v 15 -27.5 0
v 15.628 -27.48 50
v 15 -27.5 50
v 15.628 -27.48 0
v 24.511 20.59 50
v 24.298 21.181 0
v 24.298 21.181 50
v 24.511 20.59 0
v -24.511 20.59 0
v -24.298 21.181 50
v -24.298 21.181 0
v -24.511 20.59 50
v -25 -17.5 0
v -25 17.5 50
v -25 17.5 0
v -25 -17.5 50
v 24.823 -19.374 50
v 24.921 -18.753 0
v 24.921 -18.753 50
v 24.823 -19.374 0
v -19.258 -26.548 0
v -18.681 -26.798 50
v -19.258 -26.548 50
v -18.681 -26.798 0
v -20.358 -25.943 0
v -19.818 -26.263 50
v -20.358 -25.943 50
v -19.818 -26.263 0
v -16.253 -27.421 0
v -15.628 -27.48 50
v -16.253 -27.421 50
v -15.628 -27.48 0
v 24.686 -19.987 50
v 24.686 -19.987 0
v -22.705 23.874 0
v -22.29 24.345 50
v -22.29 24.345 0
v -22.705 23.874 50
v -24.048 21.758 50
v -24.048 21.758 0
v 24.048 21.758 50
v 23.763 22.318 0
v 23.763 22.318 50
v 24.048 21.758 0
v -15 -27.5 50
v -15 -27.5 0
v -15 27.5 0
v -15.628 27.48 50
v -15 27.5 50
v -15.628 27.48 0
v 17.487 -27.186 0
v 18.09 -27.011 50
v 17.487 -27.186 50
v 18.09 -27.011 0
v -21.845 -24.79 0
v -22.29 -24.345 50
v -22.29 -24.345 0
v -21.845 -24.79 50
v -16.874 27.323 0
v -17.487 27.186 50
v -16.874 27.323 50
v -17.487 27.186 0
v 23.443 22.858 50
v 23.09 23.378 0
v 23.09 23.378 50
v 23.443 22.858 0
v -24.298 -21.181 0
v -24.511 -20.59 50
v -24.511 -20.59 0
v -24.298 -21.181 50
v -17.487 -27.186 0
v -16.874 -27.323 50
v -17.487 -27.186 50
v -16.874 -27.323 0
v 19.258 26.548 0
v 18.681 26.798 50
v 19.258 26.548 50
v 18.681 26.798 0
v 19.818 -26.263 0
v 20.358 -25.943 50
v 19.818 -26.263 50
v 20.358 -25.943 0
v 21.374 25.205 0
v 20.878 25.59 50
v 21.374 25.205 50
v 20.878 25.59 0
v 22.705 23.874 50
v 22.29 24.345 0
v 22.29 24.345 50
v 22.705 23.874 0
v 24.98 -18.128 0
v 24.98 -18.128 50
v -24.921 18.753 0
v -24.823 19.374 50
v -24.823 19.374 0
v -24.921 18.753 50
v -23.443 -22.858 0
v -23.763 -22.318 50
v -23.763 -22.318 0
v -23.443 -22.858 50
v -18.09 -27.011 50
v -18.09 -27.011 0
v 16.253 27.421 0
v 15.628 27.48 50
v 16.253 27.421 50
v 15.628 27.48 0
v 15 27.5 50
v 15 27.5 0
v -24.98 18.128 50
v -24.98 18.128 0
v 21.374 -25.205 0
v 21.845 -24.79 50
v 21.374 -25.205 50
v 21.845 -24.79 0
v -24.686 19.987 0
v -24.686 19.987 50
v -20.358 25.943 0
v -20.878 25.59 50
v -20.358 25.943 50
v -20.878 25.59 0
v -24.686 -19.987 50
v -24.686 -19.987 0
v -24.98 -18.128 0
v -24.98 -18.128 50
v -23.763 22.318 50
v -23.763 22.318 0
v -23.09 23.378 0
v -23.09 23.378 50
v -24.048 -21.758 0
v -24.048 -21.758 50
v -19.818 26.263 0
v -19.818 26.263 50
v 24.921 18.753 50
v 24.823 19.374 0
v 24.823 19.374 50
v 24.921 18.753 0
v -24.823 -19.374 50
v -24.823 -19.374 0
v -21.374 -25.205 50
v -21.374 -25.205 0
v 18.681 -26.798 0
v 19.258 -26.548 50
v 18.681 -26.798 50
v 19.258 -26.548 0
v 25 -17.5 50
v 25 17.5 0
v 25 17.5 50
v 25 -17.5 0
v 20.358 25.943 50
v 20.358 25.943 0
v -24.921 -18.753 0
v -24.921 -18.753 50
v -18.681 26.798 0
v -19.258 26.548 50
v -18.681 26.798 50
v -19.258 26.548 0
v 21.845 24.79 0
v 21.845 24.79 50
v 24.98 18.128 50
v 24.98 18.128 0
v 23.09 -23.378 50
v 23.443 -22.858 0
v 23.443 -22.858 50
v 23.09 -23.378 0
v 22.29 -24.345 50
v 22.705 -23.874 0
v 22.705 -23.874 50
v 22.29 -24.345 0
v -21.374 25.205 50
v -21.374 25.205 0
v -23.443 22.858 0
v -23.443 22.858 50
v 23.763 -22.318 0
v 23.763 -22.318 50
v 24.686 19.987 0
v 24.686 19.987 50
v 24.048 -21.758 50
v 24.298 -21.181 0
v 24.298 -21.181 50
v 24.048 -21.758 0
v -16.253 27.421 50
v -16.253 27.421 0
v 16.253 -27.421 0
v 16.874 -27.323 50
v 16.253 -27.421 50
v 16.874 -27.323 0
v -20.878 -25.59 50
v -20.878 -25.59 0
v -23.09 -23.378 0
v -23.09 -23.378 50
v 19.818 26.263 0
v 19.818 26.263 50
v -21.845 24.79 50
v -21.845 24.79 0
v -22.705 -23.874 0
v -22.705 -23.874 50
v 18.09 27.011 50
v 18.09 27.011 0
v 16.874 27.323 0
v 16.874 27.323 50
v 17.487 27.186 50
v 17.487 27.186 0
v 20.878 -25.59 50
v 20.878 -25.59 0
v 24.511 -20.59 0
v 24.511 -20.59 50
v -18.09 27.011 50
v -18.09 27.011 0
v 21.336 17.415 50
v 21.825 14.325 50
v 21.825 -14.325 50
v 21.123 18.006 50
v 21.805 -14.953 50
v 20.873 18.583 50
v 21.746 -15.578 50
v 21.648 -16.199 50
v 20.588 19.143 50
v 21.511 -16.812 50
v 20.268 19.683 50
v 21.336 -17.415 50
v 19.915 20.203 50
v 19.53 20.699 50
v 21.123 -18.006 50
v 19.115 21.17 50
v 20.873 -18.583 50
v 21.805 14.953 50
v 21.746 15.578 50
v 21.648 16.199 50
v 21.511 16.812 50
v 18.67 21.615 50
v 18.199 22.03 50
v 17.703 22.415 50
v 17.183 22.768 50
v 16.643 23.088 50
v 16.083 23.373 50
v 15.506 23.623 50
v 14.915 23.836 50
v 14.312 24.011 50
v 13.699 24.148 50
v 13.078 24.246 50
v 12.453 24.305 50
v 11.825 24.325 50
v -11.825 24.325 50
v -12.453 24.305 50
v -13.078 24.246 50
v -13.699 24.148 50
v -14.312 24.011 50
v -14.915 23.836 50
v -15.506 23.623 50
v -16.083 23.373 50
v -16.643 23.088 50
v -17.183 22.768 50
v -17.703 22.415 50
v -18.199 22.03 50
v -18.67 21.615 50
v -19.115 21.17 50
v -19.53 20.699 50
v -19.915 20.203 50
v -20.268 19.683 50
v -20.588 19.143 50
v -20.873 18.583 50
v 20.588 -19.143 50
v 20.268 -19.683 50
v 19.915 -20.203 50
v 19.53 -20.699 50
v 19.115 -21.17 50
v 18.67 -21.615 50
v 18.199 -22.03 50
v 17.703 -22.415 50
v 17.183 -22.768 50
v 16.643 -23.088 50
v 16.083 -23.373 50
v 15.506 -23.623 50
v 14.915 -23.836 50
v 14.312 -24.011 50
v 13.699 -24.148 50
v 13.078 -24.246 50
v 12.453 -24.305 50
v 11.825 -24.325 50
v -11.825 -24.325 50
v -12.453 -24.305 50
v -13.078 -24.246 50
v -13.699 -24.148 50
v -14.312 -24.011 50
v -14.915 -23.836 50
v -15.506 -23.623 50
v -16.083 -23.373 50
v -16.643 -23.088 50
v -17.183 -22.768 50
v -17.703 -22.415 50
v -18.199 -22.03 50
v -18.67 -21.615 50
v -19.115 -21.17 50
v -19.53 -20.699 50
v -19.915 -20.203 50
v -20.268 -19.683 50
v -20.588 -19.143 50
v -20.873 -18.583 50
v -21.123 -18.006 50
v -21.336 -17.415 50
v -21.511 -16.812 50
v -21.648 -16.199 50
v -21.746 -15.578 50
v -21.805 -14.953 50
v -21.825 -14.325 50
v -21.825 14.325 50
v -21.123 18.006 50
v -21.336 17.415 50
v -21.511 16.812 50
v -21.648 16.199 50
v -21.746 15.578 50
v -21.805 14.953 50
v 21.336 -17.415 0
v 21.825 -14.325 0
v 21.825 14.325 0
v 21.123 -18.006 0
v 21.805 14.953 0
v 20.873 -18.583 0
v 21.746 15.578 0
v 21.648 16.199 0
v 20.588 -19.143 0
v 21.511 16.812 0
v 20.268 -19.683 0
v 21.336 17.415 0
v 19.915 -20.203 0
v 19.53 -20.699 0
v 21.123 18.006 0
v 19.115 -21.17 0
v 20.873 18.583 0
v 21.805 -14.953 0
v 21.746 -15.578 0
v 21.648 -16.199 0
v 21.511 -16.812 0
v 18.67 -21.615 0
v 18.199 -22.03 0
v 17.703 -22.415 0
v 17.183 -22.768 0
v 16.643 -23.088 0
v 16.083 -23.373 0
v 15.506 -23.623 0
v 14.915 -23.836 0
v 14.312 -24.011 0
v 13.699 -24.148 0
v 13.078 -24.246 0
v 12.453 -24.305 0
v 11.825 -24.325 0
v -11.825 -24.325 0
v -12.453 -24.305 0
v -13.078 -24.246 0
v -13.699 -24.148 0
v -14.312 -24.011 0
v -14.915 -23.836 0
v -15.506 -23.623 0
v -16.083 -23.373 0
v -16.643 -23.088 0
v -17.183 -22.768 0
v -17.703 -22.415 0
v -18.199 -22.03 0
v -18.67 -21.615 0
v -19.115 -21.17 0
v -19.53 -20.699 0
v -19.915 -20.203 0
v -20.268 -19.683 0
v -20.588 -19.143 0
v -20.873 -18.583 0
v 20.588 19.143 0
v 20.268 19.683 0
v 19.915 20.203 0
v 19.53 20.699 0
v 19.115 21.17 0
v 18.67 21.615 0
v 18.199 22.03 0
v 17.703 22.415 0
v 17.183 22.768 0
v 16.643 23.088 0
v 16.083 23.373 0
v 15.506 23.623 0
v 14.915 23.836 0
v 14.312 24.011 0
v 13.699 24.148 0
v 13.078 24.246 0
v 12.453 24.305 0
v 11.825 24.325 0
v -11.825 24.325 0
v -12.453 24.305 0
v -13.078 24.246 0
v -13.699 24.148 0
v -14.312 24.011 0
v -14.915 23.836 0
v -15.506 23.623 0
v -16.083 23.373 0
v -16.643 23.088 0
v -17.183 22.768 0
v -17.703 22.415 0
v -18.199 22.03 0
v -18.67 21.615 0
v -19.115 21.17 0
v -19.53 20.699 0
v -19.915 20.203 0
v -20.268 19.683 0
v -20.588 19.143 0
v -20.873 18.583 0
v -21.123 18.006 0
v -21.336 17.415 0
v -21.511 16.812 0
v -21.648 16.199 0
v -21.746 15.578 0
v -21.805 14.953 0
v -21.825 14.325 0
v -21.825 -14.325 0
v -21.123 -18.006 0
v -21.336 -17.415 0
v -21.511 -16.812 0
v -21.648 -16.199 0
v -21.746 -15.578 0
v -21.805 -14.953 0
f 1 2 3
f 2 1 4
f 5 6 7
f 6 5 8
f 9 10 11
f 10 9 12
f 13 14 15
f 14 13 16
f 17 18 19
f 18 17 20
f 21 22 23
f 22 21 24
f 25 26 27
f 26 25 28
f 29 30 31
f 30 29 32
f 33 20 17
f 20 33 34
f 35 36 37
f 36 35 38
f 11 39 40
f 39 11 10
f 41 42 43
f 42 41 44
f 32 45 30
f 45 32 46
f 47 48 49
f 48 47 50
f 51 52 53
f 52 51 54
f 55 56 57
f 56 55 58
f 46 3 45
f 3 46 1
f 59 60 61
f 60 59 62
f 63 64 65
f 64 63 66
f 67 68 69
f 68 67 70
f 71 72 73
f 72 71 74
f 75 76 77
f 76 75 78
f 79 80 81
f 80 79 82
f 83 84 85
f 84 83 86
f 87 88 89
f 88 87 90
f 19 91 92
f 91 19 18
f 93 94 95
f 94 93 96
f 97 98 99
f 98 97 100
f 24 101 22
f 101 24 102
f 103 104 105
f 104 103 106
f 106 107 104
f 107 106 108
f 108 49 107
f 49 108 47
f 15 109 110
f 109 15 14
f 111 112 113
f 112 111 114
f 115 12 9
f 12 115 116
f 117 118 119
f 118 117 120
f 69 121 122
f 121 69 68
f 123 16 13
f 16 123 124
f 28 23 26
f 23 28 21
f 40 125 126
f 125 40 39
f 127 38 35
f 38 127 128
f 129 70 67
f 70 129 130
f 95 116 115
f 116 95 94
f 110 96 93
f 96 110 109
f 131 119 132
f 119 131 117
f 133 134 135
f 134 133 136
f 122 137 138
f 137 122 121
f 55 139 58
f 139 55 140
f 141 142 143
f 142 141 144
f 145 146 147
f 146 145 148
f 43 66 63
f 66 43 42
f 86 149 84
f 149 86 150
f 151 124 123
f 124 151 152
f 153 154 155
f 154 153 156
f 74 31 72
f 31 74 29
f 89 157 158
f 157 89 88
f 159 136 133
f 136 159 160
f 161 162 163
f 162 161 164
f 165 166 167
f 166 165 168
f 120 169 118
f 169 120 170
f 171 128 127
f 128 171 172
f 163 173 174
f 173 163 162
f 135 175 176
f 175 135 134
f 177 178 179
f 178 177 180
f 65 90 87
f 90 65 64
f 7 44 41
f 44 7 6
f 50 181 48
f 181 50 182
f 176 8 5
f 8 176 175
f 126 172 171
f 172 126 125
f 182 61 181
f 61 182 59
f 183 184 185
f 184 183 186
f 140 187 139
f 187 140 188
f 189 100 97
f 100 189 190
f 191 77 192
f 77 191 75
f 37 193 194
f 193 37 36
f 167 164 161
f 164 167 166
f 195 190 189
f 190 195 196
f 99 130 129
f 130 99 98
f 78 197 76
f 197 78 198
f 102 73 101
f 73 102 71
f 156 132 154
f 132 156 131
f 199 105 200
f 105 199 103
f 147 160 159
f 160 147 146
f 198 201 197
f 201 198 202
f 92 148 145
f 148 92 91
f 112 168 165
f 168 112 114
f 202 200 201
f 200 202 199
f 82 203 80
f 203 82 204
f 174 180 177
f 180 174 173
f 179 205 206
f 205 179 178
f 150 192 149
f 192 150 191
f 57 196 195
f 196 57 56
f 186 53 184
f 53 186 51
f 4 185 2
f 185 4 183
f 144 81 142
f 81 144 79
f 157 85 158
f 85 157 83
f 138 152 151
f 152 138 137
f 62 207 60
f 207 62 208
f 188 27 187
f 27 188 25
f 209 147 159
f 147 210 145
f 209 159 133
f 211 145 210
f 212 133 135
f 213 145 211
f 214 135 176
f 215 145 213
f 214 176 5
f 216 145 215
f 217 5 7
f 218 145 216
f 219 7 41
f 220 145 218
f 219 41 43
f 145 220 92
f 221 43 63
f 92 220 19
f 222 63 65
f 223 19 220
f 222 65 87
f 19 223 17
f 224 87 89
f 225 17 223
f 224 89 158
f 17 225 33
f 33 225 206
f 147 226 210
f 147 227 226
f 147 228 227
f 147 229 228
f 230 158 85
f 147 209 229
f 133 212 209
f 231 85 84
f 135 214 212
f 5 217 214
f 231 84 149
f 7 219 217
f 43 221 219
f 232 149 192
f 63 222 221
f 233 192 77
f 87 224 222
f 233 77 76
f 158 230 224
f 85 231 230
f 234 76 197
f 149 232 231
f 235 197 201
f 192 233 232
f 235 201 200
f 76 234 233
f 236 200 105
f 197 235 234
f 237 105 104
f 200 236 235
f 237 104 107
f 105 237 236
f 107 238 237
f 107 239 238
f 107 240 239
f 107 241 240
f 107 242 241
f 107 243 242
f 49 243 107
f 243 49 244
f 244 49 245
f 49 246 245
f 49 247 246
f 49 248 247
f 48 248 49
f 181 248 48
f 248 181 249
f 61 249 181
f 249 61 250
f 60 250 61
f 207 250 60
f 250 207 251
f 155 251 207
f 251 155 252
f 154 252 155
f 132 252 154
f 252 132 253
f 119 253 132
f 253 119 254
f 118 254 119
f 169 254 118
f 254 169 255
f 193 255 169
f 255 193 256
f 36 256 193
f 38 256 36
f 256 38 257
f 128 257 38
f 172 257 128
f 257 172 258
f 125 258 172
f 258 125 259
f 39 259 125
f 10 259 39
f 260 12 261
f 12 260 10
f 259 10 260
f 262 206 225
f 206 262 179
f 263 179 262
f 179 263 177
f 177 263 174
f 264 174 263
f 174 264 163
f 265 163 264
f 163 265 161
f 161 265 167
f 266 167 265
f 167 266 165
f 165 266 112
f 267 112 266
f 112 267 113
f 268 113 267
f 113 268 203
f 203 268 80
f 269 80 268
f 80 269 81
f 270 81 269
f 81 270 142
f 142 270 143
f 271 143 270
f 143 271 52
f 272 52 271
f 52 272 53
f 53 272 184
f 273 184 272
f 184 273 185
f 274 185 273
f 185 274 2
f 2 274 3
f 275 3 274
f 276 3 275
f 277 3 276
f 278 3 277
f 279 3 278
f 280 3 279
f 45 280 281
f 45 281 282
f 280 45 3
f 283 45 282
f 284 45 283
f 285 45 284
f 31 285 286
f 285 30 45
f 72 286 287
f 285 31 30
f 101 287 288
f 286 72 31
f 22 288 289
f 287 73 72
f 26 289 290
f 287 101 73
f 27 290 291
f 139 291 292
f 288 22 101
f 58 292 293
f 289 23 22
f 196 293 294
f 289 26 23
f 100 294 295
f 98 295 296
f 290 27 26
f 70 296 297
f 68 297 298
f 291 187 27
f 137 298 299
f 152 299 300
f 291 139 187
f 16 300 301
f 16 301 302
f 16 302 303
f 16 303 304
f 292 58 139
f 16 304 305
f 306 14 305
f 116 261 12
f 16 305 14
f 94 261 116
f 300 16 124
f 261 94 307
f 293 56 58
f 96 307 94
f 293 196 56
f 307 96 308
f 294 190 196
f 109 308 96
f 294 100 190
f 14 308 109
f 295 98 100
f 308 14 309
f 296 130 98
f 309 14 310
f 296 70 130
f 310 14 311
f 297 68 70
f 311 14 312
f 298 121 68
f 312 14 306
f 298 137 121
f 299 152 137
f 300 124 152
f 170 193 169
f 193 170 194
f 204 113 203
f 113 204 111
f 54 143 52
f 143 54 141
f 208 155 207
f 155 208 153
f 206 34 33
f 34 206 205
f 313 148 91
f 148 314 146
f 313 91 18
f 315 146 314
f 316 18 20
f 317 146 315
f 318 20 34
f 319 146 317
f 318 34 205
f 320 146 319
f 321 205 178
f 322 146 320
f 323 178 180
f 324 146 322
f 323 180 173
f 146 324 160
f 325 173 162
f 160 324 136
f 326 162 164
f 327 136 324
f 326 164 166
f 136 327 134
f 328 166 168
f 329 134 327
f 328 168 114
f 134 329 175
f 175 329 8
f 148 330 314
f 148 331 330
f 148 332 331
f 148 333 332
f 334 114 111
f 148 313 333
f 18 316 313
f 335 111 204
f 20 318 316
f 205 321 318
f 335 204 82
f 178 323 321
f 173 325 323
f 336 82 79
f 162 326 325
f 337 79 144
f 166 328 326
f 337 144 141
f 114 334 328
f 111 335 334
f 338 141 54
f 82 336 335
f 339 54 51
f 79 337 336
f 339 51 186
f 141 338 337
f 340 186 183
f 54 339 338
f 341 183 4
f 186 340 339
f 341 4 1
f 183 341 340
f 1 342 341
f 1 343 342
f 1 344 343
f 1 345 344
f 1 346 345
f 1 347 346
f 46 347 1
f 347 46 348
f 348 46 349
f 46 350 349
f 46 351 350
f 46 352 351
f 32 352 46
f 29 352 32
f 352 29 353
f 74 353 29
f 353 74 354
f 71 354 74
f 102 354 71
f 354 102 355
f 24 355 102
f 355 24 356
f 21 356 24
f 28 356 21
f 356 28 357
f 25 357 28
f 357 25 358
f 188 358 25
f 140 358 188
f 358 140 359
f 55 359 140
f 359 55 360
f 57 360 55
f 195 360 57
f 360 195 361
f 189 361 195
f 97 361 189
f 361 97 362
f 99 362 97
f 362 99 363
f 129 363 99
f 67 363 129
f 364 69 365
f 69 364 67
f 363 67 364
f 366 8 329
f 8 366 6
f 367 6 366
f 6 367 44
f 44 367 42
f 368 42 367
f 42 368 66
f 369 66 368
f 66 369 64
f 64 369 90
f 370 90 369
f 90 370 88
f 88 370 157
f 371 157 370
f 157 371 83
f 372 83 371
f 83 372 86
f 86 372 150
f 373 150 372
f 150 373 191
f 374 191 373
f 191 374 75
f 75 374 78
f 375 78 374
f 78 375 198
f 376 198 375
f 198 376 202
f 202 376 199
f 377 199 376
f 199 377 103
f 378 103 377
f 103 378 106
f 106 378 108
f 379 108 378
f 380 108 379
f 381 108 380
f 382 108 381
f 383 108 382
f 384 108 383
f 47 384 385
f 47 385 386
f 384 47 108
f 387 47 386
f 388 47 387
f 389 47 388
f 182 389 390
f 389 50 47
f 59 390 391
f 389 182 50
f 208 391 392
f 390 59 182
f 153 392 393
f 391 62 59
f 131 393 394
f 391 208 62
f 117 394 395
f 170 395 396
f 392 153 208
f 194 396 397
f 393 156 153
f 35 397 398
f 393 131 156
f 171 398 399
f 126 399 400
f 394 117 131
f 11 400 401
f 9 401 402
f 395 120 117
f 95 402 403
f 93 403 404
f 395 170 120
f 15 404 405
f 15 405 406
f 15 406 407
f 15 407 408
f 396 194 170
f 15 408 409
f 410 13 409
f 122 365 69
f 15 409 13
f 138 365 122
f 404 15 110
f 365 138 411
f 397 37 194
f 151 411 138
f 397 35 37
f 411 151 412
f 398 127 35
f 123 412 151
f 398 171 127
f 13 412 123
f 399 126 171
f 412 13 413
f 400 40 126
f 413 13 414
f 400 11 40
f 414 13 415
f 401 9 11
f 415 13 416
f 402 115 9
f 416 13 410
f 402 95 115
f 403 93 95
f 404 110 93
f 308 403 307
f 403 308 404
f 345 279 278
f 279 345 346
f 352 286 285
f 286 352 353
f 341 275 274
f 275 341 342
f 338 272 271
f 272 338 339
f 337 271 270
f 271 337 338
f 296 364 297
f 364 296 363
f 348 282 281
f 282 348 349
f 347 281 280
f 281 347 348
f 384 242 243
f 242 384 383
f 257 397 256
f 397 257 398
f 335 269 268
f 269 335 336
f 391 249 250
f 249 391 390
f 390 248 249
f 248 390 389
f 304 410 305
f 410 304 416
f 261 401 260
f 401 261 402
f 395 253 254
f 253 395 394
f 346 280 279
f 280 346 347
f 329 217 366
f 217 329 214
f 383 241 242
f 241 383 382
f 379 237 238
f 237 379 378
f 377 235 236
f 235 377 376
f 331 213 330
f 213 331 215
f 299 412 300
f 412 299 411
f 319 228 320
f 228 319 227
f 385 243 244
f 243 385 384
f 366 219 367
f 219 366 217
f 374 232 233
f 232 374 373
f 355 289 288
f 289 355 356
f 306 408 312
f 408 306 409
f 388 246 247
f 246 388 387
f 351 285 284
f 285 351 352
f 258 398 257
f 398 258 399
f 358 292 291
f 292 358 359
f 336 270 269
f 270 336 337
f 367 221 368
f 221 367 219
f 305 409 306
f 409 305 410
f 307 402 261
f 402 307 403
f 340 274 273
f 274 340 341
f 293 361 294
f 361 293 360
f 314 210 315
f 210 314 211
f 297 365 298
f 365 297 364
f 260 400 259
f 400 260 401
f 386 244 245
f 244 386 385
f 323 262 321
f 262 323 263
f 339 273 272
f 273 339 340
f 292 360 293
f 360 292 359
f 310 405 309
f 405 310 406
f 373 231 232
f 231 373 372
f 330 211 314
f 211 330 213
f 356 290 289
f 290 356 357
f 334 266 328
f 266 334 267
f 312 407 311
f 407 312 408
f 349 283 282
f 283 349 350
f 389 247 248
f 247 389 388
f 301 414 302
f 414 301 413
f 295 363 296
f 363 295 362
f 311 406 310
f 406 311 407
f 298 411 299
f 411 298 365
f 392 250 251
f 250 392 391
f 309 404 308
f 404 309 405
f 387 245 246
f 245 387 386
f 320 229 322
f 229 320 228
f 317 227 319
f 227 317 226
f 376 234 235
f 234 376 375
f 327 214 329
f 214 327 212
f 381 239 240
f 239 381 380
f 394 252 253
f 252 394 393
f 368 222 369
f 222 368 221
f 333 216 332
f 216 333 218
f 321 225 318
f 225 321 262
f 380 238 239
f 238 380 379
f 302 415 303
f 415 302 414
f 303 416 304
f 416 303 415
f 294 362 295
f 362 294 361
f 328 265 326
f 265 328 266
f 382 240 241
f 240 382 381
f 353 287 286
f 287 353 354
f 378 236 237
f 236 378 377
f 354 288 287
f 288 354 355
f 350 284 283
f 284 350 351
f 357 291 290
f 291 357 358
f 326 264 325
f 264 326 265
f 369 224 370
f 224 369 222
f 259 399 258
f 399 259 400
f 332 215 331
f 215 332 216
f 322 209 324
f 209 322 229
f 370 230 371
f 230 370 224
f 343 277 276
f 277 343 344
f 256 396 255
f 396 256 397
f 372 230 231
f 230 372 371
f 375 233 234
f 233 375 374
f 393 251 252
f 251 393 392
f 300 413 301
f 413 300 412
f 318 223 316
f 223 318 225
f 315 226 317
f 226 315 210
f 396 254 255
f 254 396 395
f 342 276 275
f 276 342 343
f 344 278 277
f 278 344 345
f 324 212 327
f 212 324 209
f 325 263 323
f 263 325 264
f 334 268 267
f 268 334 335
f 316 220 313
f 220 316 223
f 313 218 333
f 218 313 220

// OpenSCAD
// file: variables.scad
// Global
overlap = 0.01; 
centered = true;
$fn = 100;
in = 25.4;
cm = 10;
mm = 1;
thickness = 0.25 *in;

// Head
head_radius = 3 *in;
head_translation = 6 *in;
head_depth = 8 *in;
head_thickness = 0.25 *in;
head_height = head_radius * 2;
head_width = head_radius * 2 + head_translation;

// Chest
chest_width = 8.5 * in; 
chest_height = 6 *in; 
chest_offset = 1 *in;
chest_depth = 6.5 *in; 
chest_thickness = 0.25 *in;

// Base 
base_width = 8.5 *in;
base_height = 6 *in;
base_offset = 1 *in;
base_depth = 140 *mm;
base_top_width = 108 *mm;
base_top_height = 76 *mm;
base_top_depth = 55 *mm;
base_top_offset = 1 *in;
base_thickness = 0.25 *in;
base_divot_width = 70 *mm;
base_divot_height = 15 *mm;
base_divot_depth = 50 *mm;
caster_hole_diameter = 5*mm;
caster_hole_from_width1 = 3 *mm + caster_hole_diameter/2;
caster_hole_from_width2 = 2.5 *mm + caster_hole_diameter/2;
caster_hole_from_height = 8.5 *mm + caster_hole_diameter/2;

// Shoulder
shoulder_diameter = 2 *in;
shoulder_translation = 1.50 *in;
shoulder_height = 2 *in;
shoulder_thickness = thickness;
shoulder_mount_thickness = thickness;

// Rim
rim_thickness = 0.125 *in;
rim_depth = 0.75 *in;

// Camera
cam_radius = 0.25 *in;
cam_depth = 3 *in;
cam_height = head_radius/4;
cam_distance = head_translation;

// Plate
plate_width = head_translation-cam_radius*2;
plate_depth = head_depth/2; 
plate_height = head_radius-cam_height;
plate_thickness = head_thickness;

// Microphone
mic_radius = 3 *cm;
mic_height = 0.5 *in;

// Vents
vent_radius = 0.2 *in;
vent_depth = 1 *in;

// Neck
neck_width = 3 *cm;
neck_height = 3.5 *cm;
neck_depth = 5 *cm;
neck_offset = 10;
neck_thickness = thickness;

//Microcomputer
raspi_width = 85;
raspi_depth = 56;
raspi_height = 17;

// Spine
spine_width = 4 *cm;
spine_height = 4.5 *cm;
spine_depth = 19 *in;
spine_mount_thickness = 0.25 *cm;
spine_mount_hole = 6 *mm;
spine_mount_diameter = 2.1 *cm;
spine_mount_depth = 2.5 *cm;

// Base Spine Mount
spine_bottom_height = 0.75 *in;
spine_bottom_width = 0.75 *in;
spine_bottom_depth = 0.75 *in;
spine_bottom_translation = 0.4 *in;

spine_base_width = 1.6 *in;
spine_base_height = 3.1 *in; 
spine_base_depth = 4 *in;
spine_base_thickness = 0.25 *in*2;

spine_cord_width = 1 *in;
spine_cord_height = 1 *in;
spine_cord_depth =  1 *in;

// Speaker 
speaker_width = 4.33 *in;
speaker_depth = 4.13 *in;
speaker_height = 3.5 *in;

// Motor Driver
driver_height = 3.75 *in;
driver_width  = 1.1 *in;
driver_depth  = 2.75 *in; 

// Power Supply
psu_height = 8.5 *in;
psu_width = 4.5 *in;
psu_depth = 2 *in;
power_supply_width = 5 *in;
power_supply_depth = 2.5 *cm;
power_supply_height = base_thickness*2;

// Steppers 
frame_width = 57 *mm; 
frame_height = 57 *mm;
frame_depth = 56 *mm; 
emboss_height = 1.6 *mm;
emboss_diameter = 38.1 *mm;
shaft_length = 21.5 *mm;
shaft_divot_height = 15.25 *mm;
shaft_divot_width  = 0.4 *mm;
shaft_diameter = 6.35 *mm;
large_shaft_diameter = 0.6 *in;
arm_clamp_thickness = 0.25 *in;

// Screws
screw_type = "M3";
screw_distance = 0.06 *in;
m3_screw_thread_depth = 7;
m3_screw_thread_diameter = 3;
m3_screw_head_depth = 3.5;
m3_screw_head_diameter = 7;
nema23_screw_diameter = 5 *mm;
nema23_screw_distance = 47 *mm;

// Ender 3 Build Volume
ender_3_width = 220 *mm;
ender_3_height = 220 *mm;
ender_3_depth = 250 *mm;

// Wheels
wheel_diameter = 7 *in;
wheel_width = 1.5 *in;

// Shaft Mount
arm_clamp_width = 10 *mm;
arm_clamp_depth = shaft_diameter+thickness;
arm_clamp_height = shaft_diameter+thickness*2;

// Arm Integrated Lead Screw Stepper 
integrated_stepper_width = 42.3 *mm;
integrated_stepper_height = 42.3 *mm;
integrated_stepper_depth = 39.5 *mm;
integrated_emboss_height = 2 *mm;
integrated_emboss_diameter = 22 *mm;
integrated_port_height = 7 *mm;
integrated_port_width = 16 *mm;
integrated_port_depth = 9.6 *mm;
lead_screw_diameter = 10 *mm;
lead_screw_length = 200 *mm; 
lead_nut_diameter = 22 *mm;
lead_nut_height = 3.8 *mm;
nema17_screw_distance = 31 *mm;
nema17_screw_diameter = undef;

// Arm
arm_thickness = thickness;
arm_height = integrated_stepper_height + arm_thickness;
arm_depth =  lead_screw_length;
arm_width = integrated_stepper_width + arm_thickness;
arm_clamp_offset = 10;

// Stepper Module
module NEMA23(){	

	// Emboss
	translate([0,0,frame_depth/2+emboss_height/2])
	cylinder(h=emboss_height,d=emboss_diameter,center=centered);

	// Shaft
	difference(){
		translate([0,0,frame_depth/2+shaft_length/2])
			cylinder(h=shaft_length,d=shaft_diameter,center=centered);
		translate([-shaft_diameter/2+shaft_divot_width/2,0,-shaft_divot_height/2+frame_depth/2+shaft_length])
		cube([shaft_divot_width,shaft_diameter, shaft_divot_height+overlap],center=centered);
	}

	// Frame
	cube([frame_width,frame_height,frame_depth], center=centered);

	// Screws
	for(screw_distance=[-nema23_screw_distance/2:nema23_screw_distance/2:nema23_screw_distance/2]){
		translate([screw_distance,screw_distance,frame_depth/2])
		cylinder(h=emboss_height+thickness,d=nema23_screw_diameter);
		translate([-screw_distance,screw_distance,frame_depth/2])
		cylinder(h=emboss_height+thickness,d=nema23_screw_diameter);		
	}
}

// Integrated Stepper Module
module NEMA17(){	

	// Emboss
	translate([0,0,integrated_stepper_depth/2+integrated_emboss_height/2])
	cylinder(h=integrated_emboss_height,d=integrated_emboss_diameter,center=centered);

	// Lead Screw
	difference(){
		translate([0,0,integrated_stepper_depth/2+lead_screw_length/2])
			cylinder(h=lead_screw_length,d=lead_screw_diameter,center=centered);
	}

	// Frame
	cube([integrated_stepper_width,integrated_stepper_height,integrated_stepper_depth], center=centered);

	// Screws
	for(screw_distance=[-nema17_screw_distance/2:nema17_screw_distance/2:nema17_screw_distance/2]){
		translate([screw_distance,screw_distance,integrated_stepper_depth/2])
		cylinder(h=integrated_emboss_height+thickness,d=nema17_screw_diameter);
		translate([-screw_distance,screw_distance,integrated_stepper_depth/2])
		cylinder(h=integrated_emboss_height+thickness,d=nema17_screw_diameter);		
	}
} 
// main file
// Lib
include <variables.scad>;

// Module
module neck(){

	// Neck Positive
	difference(){
		linear_extrude(neck_depth)
			offset(neck_offset)
				square([neck_width, neck_height], center=centered);

		// Neck Hollow Negative
		translate([0,0,-neck_thickness/2])
			linear_extrude(neck_depth+neck_thickness)
				offset(neck_offset)
					square([neck_width-neck_thickness, neck_height-neck_thickness], center=centered);
	}
}

// Call
neck();
